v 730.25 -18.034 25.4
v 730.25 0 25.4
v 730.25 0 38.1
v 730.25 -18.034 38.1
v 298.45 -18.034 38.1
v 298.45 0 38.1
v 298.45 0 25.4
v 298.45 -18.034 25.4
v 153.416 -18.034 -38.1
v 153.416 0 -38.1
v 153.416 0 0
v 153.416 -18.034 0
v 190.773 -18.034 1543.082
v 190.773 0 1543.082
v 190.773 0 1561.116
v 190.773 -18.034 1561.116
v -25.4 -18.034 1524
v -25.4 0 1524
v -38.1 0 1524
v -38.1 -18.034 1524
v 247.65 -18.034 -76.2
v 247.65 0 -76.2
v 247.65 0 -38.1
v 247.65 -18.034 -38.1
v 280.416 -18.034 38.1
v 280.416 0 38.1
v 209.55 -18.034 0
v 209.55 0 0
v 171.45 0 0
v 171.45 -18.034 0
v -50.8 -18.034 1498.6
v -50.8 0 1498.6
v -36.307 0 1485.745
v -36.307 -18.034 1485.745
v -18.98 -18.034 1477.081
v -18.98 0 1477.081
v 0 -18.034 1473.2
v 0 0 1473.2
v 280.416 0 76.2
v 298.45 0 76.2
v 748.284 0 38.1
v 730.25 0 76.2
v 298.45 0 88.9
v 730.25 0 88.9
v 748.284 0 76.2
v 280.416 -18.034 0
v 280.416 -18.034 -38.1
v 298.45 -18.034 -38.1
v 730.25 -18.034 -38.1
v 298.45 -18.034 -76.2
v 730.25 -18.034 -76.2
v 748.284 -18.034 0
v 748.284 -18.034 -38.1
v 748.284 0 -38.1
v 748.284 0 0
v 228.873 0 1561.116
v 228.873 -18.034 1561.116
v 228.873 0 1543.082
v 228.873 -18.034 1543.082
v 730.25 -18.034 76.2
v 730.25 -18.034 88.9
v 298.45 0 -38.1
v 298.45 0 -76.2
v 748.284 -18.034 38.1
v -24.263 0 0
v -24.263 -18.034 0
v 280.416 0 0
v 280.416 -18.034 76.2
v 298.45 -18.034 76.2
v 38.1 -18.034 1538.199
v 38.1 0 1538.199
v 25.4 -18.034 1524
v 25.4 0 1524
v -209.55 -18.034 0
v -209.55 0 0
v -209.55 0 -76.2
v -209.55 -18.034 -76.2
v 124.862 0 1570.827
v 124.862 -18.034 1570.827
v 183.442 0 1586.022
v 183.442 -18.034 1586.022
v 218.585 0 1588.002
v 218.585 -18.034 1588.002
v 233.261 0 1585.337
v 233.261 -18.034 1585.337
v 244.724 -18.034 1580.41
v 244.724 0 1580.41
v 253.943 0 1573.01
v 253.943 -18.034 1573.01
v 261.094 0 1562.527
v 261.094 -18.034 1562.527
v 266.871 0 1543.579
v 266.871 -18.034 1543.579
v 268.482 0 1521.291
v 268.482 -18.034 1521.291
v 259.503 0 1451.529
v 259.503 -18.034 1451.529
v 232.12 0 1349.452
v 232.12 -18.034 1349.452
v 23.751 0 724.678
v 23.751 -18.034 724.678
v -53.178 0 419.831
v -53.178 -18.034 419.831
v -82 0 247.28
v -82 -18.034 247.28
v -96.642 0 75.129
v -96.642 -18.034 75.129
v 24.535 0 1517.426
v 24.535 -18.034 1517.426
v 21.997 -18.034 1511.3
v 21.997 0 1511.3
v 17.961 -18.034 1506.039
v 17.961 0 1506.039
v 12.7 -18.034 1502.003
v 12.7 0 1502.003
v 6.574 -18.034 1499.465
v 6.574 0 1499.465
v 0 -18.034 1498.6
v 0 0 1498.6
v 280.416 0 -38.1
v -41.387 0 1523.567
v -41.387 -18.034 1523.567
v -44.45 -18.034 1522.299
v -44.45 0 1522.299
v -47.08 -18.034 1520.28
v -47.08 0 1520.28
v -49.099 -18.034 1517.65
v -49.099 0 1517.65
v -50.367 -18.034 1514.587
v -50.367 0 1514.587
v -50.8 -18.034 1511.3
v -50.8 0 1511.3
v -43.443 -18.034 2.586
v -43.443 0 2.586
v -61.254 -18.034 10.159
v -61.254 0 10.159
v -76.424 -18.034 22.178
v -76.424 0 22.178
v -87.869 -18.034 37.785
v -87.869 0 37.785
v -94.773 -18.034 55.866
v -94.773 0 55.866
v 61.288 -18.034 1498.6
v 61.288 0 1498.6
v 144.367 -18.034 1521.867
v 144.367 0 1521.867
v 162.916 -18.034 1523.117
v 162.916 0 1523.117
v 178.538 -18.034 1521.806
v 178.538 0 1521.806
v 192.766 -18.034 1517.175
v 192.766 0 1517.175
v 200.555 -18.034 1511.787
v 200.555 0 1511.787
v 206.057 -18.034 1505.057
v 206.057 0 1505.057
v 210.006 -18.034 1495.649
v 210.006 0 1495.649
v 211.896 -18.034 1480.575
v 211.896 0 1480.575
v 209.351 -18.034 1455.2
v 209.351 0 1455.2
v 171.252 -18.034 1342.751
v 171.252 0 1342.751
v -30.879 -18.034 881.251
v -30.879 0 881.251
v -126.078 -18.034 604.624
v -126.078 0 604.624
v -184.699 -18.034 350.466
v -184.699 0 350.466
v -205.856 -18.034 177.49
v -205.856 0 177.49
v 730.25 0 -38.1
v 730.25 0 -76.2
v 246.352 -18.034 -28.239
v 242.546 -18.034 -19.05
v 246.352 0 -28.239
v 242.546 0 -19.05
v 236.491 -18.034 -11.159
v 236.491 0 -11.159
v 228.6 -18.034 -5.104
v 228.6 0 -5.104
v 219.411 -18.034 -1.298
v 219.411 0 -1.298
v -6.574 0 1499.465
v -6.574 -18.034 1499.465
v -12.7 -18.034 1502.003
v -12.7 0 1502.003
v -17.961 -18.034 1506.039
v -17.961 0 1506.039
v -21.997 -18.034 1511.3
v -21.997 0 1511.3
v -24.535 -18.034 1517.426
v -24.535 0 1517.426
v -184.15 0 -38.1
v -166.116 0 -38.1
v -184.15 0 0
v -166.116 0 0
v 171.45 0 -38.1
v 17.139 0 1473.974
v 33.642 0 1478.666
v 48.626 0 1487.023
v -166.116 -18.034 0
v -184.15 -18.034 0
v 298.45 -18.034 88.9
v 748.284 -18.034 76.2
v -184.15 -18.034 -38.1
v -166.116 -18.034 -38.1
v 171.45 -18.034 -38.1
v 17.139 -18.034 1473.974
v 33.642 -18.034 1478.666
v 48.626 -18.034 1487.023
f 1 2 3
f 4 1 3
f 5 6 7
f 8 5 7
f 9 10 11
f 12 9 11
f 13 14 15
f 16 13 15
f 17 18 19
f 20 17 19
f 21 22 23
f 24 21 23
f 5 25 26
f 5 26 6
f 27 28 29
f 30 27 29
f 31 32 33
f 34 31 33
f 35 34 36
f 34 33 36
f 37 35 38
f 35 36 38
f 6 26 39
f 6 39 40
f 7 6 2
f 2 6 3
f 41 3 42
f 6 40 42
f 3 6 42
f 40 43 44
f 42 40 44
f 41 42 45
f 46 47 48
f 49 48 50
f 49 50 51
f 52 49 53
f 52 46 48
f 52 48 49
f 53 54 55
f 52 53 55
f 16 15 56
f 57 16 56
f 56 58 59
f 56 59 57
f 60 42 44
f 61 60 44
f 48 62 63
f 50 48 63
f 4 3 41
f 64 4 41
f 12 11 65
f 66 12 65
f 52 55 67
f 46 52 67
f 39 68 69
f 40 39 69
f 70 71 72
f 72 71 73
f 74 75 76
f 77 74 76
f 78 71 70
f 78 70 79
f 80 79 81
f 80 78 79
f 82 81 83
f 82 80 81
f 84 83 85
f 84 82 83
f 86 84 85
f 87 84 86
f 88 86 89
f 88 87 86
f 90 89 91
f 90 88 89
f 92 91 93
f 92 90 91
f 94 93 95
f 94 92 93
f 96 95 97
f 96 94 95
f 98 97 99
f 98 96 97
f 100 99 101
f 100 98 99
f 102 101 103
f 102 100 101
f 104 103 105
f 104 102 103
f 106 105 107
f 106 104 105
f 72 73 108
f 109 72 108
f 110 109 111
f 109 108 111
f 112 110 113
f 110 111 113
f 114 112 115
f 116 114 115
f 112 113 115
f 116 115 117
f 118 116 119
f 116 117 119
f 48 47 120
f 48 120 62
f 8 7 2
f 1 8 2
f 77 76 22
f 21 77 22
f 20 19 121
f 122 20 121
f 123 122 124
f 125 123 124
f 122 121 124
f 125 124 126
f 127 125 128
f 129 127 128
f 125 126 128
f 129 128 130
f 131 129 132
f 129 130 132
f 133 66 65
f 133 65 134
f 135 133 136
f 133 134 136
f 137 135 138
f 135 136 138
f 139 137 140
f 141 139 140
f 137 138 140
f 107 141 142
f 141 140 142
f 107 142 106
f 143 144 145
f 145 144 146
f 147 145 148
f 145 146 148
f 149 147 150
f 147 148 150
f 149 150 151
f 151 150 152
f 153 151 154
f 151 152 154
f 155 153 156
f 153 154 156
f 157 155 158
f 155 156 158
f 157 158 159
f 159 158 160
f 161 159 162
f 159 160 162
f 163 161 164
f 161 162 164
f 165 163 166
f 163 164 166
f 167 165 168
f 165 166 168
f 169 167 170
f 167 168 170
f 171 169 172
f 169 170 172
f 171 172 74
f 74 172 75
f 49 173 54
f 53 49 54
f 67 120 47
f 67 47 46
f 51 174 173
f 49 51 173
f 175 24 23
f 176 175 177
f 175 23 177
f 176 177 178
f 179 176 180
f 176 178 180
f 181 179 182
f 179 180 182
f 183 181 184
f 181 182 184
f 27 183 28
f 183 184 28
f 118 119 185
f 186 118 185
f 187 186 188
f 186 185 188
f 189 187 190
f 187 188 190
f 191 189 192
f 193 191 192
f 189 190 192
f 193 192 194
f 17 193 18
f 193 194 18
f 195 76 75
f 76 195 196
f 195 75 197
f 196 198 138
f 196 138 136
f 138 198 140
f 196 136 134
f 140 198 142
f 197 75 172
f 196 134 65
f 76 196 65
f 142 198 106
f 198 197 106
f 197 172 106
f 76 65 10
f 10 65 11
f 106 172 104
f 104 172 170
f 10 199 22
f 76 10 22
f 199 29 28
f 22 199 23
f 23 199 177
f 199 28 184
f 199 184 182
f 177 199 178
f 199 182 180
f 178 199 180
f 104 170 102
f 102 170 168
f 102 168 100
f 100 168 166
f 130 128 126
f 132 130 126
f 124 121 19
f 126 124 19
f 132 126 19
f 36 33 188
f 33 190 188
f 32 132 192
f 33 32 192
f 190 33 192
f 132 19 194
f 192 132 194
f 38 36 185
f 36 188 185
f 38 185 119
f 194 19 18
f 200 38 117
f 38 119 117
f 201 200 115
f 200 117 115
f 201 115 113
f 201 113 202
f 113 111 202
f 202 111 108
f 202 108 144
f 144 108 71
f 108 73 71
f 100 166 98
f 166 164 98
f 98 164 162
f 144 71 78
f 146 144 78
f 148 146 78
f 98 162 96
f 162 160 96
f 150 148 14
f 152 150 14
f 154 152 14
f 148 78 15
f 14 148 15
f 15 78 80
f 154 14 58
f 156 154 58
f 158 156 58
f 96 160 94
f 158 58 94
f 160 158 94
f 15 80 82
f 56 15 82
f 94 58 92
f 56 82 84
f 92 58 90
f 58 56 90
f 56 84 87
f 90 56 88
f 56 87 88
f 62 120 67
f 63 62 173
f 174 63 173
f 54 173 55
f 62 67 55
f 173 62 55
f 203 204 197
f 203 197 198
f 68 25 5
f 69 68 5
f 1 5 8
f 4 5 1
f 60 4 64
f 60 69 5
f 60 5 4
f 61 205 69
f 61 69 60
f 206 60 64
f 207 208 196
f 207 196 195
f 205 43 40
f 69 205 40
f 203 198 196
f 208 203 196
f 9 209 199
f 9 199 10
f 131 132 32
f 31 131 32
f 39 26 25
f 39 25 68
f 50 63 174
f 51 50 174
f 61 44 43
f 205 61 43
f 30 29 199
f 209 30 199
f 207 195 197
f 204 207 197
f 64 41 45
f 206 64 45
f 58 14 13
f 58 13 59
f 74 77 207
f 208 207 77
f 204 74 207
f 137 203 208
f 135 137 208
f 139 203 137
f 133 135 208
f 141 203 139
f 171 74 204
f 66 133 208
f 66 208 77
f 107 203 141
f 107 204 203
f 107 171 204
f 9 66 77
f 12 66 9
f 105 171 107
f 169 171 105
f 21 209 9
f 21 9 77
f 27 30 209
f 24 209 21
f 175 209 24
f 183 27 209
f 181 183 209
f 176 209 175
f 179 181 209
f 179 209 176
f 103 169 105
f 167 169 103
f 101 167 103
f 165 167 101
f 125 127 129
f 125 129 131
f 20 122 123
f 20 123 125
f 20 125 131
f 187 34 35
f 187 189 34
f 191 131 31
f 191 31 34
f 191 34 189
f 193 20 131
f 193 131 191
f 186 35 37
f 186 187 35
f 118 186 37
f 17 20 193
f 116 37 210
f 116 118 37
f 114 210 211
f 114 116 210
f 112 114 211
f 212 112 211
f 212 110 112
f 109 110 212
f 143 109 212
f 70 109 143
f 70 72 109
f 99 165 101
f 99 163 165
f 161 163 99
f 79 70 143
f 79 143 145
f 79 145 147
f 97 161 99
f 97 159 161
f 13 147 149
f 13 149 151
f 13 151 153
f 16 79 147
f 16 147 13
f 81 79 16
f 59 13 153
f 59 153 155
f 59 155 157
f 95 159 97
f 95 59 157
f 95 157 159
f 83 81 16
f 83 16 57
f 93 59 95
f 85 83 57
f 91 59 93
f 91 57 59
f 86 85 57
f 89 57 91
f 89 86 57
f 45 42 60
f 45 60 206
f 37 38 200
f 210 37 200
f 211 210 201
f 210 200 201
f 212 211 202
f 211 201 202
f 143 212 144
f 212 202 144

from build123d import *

# Parameters (mm, degrees)
F0_W     = 18.034
F0_H     = 38.1
F1_DEPTH = 18.034
F0_W_2   = 38.1
F0_H_2   = 18.034


with BuildPart() as f1:
    # F0 (on Front) → F1 (new body)
    with BuildSketch(Plane.XZ):
        Polygon((730.25, 0), (298.45, 0), (298.45, -38.1), (298.45, -76.2), (730.25, -76.2), (730.25, -38.1), align=None)
        with Locations((289.433, -19.05)):
            Rectangle(F0_W, F0_H)
        with Locations((739.267, -19.05)):
            Rectangle(F0_W, F0_H)
    extrude(amount=F1_DEPTH)


with BuildPart() as f1b:
    # F0 (on Front) → F1, piece 2 (new body)
    with BuildSketch(Plane.XZ):
        with BuildLine():
            Line((-184.15, 0), (-209.55, 0))
            Line((-209.55, 0), (-209.55, -76.2))
            Line((-209.55, -76.2), (247.65, -76.2))
            Line((247.65, -76.2), (247.65, -38.1))
            ThreePointArc((247.65, -38.1), (236.4907683632, -11.1592316368), (209.55, 0))
            Line((209.55, 0), (171.45, 0))
            Line((171.45, 0), (171.45, -38.1))
            Line((171.45, -38.1), (153.416, -38.1))
            Line((153.416, -38.1), (153.416, 0))
            Line((153.416, 0), (-24.2630077299, 0))
            Line((-24.2630077299, 0), (-166.116, 0))
            Line((-166.116, 0), (-166.116, -38.1))
            Line((-166.116, -38.1), (-184.15, -38.1))
            Line((-184.15, -38.1), (-184.15, 0))
        make_face()
        with BuildLine():
            add(Edge.make_bspline(
                [(61.2882599734, 1498.6), (123.2096838063, 1522.726835876), (413.710255519, 1585.8003394725), (-234.8449324839, 729.4511206789), (-209.55, 0)],
                knots=[0, 0, 0, 0, 0.2346991242, 1, 1, 1, 1], degree=3))
            Line((-209.55, 0), (-184.15, 0))
            Line((-184.15, 0), (-166.116, 0))
            Line((-166.116, 0), (-24.2630077299, 0))
            ThreePointArc((-24.2630077299, 0), (-76.4240599539, 22.1778011054), (-96.6416075826, 75.1294866204))
            add(Edge.make_bspline(
                [(38.1, 1538.1990316571), (132.1271545862, 1575.9034953538), (489.2555231672, 1713.1156448449), (-72.4121528108, 724.5196297428), (-96.6416075826, 75.1294866204)],
                knots=[0, 0, 0, 0, 0.2760813128, 1, 1, 1, 1], degree=3))
            Line((38.1, 1538.1990316571), (25.4, 1524))
            ThreePointArc((25.4, 1524), (17.9605122421, 1506.0394877579), (0, 1498.6))
            Line((0, 1498.6), (0, 1473.2))
            ThreePointArc((0, 1473.2), (33.6421933009, 1478.6659022118), (61.2882599734, 1498.6))
        make_face()
        with Locations((209.8233869791, 1552.0993377762)):
            Rectangle(F0_W_2, F0_H_2, mode=Mode.SUBTRACT)
        with BuildLine():
            ThreePointArc((-50.8, 1498.6), (-27.9274346831, 1480.8451306338), (0, 1473.2))
            Line((0, 1473.2), (0, 1498.6))
            ThreePointArc((0, 1498.6), (-17.9605122421, 1506.0394877579), (-25.4, 1524))
            Line((-25.4, 1524), (-38.1, 1524))
            ThreePointArc((-38.1, 1524), (-47.0802561211, 1520.2802561211), (-50.8, 1511.3))
            Line((-50.8, 1511.3), (-50.8, 1498.6))
        make_face()
    extrude(amount=F1_DEPTH)


with BuildPart() as f1c:
    # F0 (on Front) → F1, piece 3 (new body)
    with BuildSketch(Plane.XZ):
        with Locations((289.433, 57.15)):
            Rectangle(F0_W, F0_H)
        Polygon((298.45, 38.1), (298.45, 25.4), (730.25, 25.4), (730.25, 38.1), (730.25, 76.2), (730.25, 88.9), (298.45, 88.9), (298.45, 76.2), align=None)
        with Locations((739.267, 57.15)):
            Rectangle(F0_W, F0_H)
    extrude(amount=F1_DEPTH)


solid = Compound([f1.part, f1b.part, f1c.part])
